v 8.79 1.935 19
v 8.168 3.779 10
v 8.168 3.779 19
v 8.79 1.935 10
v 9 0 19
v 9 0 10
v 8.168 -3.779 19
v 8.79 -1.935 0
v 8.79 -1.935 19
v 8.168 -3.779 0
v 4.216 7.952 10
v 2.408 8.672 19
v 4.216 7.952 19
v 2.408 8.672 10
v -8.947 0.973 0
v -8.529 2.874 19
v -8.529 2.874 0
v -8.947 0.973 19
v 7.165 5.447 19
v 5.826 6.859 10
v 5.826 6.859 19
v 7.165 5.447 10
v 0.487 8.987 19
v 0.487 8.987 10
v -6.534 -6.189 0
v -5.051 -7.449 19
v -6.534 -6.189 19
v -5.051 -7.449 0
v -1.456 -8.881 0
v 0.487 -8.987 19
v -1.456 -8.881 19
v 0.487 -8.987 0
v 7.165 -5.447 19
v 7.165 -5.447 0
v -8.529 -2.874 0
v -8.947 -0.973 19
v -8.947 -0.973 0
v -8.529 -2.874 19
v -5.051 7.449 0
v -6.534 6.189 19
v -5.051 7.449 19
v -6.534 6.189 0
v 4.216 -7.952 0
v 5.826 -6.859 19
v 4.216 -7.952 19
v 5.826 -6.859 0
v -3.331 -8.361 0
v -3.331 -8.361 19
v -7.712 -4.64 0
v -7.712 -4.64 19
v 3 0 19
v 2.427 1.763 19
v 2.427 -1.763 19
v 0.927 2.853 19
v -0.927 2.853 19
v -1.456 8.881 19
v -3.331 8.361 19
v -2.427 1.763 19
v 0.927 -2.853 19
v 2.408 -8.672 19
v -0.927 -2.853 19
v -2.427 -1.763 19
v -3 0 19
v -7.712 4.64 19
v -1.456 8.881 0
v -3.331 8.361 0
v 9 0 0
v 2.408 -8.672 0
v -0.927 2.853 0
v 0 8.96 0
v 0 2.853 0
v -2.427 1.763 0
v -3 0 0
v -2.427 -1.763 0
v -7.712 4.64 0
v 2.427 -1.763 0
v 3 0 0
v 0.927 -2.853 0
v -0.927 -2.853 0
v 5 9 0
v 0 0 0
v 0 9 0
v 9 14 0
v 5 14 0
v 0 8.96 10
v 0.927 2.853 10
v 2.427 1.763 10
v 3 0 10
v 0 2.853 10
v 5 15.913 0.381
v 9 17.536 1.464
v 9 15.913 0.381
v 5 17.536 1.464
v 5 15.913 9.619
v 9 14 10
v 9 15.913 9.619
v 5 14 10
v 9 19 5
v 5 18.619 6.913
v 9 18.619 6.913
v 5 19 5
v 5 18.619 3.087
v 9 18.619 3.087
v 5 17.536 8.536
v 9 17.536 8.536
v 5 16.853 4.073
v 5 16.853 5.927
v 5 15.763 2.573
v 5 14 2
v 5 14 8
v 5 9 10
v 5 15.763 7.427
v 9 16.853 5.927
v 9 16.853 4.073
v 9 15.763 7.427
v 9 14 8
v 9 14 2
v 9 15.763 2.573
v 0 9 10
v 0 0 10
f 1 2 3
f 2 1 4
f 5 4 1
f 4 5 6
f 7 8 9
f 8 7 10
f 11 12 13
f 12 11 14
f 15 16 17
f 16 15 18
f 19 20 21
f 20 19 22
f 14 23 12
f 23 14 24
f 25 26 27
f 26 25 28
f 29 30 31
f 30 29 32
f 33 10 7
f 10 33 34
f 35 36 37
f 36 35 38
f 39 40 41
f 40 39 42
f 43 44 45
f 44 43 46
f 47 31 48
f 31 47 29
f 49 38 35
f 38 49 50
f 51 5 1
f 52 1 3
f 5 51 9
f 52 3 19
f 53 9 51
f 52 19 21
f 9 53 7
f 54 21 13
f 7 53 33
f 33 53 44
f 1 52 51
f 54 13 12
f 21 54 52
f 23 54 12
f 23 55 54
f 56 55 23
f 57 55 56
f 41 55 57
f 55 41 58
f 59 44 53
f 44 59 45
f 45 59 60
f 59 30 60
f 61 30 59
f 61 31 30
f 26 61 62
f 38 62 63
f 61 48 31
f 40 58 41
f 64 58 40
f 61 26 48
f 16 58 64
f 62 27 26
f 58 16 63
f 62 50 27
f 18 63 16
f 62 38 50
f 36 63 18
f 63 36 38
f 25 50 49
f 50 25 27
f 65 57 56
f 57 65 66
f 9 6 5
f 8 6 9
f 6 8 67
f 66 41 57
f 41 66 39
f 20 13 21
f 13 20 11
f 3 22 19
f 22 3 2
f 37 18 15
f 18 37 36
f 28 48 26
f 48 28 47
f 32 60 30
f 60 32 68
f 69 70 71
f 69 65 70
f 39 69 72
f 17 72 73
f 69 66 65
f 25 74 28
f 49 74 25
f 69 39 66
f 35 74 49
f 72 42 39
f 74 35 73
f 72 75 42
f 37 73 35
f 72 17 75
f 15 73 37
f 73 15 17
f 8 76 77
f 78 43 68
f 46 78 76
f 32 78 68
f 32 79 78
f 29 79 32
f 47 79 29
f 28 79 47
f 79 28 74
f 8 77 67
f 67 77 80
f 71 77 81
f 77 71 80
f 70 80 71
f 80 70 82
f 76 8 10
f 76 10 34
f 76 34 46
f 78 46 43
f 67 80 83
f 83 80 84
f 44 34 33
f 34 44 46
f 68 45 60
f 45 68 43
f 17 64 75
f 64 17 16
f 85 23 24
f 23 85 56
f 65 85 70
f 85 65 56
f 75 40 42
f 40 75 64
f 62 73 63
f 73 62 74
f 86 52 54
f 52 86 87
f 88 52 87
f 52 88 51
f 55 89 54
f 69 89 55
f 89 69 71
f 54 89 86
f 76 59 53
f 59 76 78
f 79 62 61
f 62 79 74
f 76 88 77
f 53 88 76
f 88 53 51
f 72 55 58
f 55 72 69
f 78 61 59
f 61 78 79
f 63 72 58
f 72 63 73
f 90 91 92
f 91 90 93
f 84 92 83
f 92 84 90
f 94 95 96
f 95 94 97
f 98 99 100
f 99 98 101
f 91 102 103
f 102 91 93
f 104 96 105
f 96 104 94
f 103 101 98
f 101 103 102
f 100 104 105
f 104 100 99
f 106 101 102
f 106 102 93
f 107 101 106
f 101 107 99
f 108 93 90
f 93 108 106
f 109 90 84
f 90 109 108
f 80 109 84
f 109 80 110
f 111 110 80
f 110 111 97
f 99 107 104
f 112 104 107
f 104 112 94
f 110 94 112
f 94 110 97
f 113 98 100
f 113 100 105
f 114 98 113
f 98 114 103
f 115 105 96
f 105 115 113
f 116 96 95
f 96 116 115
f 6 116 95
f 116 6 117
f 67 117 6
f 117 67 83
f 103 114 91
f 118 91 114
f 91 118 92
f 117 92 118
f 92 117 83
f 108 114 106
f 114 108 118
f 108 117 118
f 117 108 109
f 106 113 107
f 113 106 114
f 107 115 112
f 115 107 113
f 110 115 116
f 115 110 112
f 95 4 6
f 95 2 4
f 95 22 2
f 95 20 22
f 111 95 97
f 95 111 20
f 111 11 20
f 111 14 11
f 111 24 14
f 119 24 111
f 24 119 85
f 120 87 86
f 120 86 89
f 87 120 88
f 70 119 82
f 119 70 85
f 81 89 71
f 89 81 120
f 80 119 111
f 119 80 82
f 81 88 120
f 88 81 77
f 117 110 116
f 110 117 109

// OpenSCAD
module rear_light_holder(){
R1=18/2;
H1=19;
#difference(){
cylinder(r=R1, h=H1);
cylinder(d=6,h=H1);
}



H2=R1+5;
H3=10;
H4=4;
//translate([R1-H4,0,(H1-R1)/2])
union(){
    cube([R1,R1,H3]);
    translate([R1-H4,0,0]) cube([H4,H2,H3]);
    translate([R1-H4,H2,H3/2]) rotate([0,90,0]) 
    difference(){
        cylinder(d=H3,h=H4);
        cylinder(d=6,h=H4);
    }
}
//6
//12 + ...

}

rear_light_holder();
